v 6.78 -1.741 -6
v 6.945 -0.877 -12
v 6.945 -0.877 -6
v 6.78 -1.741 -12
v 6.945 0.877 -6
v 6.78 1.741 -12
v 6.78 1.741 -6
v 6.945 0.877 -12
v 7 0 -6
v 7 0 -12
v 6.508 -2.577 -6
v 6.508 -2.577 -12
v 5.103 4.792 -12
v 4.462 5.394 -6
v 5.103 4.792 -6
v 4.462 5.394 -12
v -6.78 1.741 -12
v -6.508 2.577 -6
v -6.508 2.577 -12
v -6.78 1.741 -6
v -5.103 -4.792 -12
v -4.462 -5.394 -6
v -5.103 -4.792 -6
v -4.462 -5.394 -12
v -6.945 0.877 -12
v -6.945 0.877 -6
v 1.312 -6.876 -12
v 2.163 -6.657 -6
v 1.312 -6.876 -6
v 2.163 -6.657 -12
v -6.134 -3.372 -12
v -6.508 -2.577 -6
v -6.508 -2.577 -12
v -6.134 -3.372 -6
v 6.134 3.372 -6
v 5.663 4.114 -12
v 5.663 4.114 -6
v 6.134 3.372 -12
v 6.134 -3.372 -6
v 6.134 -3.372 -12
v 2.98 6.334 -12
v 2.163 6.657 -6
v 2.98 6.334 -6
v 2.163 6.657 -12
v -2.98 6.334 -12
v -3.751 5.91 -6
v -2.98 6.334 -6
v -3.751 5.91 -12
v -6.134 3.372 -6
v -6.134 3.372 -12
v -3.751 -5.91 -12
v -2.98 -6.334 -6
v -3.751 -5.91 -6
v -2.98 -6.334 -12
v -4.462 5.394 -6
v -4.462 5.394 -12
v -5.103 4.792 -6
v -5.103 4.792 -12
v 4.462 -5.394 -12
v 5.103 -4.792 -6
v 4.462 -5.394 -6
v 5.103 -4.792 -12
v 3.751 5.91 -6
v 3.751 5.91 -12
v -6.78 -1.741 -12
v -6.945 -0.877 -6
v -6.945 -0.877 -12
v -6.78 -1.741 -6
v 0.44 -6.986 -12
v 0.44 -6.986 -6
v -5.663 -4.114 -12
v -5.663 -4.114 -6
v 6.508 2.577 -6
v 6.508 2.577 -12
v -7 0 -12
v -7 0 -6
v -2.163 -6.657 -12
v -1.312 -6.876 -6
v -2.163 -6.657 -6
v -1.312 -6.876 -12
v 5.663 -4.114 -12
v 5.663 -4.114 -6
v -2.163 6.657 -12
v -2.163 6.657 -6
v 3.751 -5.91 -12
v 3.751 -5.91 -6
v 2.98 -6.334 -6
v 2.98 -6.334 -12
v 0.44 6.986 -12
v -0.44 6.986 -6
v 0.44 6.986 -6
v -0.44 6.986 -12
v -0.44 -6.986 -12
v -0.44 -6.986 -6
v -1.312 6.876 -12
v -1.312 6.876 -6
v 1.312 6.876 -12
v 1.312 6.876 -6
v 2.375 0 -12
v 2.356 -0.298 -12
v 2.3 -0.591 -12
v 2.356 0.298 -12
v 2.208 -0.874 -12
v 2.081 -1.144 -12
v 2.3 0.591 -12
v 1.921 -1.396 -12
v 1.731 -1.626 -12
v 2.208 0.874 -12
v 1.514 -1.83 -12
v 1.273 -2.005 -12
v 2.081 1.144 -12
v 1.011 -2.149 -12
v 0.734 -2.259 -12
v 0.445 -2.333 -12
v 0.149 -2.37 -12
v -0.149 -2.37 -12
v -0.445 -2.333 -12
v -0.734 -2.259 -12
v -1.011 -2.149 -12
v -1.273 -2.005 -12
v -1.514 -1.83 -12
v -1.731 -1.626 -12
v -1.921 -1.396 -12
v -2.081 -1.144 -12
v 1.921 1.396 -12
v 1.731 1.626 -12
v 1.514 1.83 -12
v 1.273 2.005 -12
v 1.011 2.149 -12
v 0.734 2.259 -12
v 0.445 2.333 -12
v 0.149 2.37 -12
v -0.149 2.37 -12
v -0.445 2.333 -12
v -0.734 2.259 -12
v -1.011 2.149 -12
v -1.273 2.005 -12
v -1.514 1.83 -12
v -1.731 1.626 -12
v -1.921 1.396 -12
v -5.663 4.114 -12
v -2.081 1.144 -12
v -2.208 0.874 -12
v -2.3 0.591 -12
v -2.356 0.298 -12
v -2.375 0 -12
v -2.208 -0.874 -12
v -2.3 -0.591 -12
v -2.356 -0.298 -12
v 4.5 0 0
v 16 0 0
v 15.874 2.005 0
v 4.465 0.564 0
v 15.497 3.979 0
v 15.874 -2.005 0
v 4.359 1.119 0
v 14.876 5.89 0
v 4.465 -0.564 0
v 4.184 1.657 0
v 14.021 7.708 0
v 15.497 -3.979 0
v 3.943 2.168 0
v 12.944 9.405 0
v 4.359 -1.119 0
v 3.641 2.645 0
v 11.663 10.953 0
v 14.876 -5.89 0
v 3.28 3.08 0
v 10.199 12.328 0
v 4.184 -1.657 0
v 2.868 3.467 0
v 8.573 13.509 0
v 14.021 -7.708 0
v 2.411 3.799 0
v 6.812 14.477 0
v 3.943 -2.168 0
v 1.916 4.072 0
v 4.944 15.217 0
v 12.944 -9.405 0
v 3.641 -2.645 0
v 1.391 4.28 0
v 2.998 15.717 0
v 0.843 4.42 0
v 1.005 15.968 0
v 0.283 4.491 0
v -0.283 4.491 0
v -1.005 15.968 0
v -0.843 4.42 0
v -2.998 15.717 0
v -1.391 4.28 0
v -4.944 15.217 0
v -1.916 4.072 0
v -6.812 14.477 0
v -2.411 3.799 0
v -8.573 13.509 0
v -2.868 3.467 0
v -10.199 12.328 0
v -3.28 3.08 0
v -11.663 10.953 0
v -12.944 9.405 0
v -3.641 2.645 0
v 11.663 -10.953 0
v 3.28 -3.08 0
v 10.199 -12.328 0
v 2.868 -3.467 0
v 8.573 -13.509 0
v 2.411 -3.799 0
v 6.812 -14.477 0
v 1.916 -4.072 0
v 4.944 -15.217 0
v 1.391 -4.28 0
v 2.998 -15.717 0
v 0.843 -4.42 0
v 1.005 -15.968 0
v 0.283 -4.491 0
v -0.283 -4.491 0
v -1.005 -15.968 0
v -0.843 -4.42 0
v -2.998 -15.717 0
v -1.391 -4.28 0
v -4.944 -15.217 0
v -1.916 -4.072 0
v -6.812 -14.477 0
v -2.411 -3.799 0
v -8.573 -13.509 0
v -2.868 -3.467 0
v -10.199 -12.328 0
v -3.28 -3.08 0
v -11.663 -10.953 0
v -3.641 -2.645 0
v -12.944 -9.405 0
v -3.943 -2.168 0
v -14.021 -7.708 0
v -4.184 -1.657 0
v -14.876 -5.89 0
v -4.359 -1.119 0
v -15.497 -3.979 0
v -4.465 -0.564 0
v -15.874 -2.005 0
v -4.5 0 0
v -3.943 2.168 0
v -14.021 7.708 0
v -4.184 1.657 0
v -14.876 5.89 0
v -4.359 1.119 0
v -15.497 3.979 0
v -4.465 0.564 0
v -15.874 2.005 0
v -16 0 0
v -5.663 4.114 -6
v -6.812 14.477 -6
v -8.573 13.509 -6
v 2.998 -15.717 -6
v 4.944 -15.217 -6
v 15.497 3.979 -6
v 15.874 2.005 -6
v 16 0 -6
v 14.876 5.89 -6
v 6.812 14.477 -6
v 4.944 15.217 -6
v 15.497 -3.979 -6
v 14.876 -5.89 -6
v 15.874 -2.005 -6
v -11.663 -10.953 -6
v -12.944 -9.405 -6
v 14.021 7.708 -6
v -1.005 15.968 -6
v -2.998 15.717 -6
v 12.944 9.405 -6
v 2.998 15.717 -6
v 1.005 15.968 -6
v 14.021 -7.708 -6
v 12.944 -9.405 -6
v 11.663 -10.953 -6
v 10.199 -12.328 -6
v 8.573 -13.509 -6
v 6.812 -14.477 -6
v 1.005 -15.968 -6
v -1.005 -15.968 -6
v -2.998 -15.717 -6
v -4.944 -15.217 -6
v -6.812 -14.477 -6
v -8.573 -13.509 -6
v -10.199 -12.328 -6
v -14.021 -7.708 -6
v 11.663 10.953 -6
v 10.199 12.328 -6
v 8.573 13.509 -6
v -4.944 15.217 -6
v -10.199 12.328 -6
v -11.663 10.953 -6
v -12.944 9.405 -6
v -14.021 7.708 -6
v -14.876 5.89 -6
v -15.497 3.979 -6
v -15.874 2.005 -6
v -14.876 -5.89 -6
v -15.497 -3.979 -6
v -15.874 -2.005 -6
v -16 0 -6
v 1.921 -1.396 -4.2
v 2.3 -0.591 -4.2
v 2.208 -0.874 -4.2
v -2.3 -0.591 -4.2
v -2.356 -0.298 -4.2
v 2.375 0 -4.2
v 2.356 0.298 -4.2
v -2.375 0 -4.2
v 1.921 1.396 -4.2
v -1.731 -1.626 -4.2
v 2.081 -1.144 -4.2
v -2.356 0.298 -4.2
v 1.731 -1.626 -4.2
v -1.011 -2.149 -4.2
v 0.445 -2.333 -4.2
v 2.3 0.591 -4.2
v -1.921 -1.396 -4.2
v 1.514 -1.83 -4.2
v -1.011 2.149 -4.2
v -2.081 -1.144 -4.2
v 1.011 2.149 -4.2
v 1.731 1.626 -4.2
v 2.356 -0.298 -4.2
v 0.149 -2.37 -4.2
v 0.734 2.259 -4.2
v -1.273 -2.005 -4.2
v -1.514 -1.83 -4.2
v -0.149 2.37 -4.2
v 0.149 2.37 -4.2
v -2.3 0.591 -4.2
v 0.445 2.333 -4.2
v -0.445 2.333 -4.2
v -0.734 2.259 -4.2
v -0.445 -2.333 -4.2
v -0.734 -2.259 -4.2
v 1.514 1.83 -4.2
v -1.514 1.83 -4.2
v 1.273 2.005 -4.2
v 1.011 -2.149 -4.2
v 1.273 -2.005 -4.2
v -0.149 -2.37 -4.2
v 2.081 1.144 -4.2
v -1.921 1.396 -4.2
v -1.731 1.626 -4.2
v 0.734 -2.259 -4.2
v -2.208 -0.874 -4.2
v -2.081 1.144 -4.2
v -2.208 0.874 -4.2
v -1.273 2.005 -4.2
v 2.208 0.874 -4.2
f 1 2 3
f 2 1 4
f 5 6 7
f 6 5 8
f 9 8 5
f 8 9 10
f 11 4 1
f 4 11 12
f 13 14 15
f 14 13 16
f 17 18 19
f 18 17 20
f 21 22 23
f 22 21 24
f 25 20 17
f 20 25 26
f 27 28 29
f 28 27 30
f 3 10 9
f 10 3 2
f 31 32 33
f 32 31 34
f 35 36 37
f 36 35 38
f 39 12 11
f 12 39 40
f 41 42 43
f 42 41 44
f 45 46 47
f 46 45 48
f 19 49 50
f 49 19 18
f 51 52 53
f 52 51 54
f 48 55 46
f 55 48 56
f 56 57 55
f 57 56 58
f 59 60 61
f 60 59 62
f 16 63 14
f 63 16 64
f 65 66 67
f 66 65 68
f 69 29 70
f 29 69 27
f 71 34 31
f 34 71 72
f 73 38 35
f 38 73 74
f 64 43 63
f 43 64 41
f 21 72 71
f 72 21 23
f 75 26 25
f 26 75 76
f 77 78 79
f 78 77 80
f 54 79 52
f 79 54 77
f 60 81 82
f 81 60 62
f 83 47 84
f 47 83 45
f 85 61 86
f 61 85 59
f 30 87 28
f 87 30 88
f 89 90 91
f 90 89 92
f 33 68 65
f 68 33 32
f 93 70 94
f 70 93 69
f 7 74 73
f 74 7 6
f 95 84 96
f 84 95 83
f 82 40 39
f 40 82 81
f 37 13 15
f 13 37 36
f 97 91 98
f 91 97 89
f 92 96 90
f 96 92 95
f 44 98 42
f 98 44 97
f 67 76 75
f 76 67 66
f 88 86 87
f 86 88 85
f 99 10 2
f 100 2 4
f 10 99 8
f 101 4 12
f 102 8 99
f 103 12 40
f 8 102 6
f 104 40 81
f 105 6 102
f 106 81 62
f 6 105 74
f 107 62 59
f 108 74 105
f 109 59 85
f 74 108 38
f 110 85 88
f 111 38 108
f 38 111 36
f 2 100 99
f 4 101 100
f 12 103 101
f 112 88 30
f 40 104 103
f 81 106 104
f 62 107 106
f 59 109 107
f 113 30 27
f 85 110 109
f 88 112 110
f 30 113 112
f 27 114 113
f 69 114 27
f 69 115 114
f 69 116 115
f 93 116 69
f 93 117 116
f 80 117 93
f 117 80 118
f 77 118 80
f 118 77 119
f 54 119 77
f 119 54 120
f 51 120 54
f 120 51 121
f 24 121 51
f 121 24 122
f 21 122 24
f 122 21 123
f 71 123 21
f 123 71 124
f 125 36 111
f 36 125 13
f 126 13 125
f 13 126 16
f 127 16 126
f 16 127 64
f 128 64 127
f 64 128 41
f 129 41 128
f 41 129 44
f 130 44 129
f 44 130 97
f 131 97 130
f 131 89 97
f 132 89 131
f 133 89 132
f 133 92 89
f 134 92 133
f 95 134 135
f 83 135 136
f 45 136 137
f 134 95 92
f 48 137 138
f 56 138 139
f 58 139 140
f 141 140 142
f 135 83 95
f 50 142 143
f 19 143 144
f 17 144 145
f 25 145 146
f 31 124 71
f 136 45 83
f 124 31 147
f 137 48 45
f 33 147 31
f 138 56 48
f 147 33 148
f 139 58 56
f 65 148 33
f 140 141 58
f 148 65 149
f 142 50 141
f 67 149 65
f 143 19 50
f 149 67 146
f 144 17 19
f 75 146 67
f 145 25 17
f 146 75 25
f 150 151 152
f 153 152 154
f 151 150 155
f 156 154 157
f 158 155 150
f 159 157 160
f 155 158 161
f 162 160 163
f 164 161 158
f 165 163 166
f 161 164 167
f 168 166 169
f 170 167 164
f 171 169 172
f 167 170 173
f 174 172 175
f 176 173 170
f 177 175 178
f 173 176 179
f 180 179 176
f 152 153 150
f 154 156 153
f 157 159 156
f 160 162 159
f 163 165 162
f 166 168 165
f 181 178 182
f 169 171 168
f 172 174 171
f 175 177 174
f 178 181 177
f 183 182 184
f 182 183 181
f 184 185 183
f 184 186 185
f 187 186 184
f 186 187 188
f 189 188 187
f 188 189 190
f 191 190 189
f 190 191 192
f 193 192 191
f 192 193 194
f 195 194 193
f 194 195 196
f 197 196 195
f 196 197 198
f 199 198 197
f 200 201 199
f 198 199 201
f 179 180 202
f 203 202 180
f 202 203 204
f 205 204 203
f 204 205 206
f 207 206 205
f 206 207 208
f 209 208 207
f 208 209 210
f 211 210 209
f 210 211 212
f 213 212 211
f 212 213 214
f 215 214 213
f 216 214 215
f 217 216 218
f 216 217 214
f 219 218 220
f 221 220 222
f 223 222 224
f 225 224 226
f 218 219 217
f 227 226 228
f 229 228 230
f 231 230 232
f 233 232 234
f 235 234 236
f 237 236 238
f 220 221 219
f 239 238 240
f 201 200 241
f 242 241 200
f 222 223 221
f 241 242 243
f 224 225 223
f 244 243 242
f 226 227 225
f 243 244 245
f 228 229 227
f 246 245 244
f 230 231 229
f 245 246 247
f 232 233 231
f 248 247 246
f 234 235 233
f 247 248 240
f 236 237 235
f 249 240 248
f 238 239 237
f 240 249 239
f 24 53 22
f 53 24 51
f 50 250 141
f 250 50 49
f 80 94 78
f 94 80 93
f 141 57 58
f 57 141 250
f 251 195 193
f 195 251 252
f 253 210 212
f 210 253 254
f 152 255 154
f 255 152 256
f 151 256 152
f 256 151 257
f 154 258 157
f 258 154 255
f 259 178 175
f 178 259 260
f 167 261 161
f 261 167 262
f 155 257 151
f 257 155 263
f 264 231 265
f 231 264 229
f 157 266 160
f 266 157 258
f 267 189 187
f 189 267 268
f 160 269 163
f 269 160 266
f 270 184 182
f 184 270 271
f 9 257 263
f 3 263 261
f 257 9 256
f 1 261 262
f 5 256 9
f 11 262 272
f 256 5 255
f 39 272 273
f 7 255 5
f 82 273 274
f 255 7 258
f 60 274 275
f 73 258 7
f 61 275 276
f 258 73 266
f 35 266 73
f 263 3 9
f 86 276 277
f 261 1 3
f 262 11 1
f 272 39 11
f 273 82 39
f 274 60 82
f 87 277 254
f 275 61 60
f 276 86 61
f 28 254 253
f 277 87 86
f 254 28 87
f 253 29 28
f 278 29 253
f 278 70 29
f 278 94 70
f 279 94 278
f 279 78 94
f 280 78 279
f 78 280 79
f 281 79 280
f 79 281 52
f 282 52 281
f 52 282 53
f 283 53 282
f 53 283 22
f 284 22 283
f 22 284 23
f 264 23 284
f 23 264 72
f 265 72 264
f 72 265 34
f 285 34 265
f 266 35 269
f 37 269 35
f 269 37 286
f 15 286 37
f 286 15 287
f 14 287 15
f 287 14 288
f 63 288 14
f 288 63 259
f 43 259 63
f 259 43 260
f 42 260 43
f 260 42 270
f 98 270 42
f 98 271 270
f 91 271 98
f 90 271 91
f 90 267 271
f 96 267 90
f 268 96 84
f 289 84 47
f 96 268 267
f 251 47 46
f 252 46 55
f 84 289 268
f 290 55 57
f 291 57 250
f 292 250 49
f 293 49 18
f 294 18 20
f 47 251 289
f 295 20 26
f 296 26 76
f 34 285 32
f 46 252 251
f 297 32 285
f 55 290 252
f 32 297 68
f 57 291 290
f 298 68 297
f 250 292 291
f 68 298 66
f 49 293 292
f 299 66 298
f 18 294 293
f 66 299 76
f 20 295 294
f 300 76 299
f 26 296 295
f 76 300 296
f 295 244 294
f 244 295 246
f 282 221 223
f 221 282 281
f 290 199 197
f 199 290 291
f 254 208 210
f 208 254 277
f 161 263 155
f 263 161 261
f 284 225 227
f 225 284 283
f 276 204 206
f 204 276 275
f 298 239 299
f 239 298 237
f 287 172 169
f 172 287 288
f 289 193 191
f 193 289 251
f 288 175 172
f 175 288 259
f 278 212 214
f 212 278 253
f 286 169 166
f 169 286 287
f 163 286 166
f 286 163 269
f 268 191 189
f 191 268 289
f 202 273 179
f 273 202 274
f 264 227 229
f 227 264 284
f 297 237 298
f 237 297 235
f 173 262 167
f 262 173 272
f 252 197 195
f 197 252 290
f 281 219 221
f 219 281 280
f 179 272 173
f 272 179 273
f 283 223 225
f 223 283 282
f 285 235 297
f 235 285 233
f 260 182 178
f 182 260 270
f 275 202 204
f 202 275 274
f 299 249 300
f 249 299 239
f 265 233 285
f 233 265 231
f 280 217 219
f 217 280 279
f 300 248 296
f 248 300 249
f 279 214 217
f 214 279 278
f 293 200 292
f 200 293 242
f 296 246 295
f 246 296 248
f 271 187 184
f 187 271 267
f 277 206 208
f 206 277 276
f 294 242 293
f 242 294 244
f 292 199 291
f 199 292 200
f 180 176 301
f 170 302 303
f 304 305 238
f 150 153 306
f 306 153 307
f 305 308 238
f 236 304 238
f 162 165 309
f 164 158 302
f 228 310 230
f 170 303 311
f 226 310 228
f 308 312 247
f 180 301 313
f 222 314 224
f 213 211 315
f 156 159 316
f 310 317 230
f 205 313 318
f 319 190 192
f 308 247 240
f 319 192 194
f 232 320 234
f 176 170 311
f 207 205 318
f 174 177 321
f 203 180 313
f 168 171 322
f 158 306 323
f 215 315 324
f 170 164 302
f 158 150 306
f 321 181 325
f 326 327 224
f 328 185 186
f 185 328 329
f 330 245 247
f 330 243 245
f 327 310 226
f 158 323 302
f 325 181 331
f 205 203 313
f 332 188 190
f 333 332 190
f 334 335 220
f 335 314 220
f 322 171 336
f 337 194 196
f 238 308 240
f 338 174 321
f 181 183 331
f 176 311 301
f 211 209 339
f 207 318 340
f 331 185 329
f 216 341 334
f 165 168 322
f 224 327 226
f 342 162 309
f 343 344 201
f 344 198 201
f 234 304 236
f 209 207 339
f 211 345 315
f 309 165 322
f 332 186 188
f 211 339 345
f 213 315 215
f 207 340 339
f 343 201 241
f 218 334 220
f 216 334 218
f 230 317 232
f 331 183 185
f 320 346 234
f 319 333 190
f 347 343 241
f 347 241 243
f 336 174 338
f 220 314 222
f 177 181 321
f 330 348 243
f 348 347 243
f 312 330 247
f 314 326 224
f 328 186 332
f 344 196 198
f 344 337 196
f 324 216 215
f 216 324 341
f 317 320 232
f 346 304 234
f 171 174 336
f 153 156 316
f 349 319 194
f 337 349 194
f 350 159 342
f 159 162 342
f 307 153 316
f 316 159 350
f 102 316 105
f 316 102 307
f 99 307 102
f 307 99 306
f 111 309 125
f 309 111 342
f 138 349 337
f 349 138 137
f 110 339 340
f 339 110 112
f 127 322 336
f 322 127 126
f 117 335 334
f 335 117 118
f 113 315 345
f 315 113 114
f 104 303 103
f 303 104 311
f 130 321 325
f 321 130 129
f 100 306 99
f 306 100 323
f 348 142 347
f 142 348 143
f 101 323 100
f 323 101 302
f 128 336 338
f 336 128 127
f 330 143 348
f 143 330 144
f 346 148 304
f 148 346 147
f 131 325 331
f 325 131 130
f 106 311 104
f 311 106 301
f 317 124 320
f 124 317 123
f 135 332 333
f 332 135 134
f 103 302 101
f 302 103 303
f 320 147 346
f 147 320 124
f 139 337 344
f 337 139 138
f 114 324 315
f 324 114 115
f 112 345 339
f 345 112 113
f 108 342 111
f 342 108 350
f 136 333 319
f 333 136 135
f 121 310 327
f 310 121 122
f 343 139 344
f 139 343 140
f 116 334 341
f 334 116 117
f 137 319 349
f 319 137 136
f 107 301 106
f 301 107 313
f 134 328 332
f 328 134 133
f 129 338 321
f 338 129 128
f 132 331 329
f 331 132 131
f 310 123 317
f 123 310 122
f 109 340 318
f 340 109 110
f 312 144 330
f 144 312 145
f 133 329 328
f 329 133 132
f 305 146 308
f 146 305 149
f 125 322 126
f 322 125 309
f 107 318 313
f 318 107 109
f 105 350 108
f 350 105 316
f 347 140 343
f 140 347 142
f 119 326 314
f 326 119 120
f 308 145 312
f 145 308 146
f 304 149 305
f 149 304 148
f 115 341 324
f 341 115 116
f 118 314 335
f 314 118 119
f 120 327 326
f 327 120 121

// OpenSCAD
$fn = 50;


difference() {
	union() {
		translate(v = [0, 0, -12.0000000000]) {
			cylinder(h = 12, r = 7.0000000000);
		}
		translate(v = [0, 0, -6.0000000000]) {
			cylinder(h = 6, r = 16.0000000000);
		}
	}
	union() {
		translate(v = [0, 0, 0]) {
			rotate(a = [0, 0, 0]) {
				difference() {
					union() {
						#translate(v = [0, 0, -12.0000000000]) {
							cylinder(h = 12, r = 2.2500000000);
						}
						#translate(v = [0, 0, -4.2000000000]) {
							cylinder(h = 4.2000000000, r = 7.0000000000, r1 = 2.3750000000, r2 = 4.5000000000);
						}
						#translate(v = [0, 0, -12.0000000000]) {
							cylinder(h = 12, r = 2.3750000000);
						}
						#translate(v = [0, 0, -12.0000000000]) {
							cylinder(h = 12, r = 2.2500000000);
						}
					}
					union();
				}
			}
		}
	}
}
